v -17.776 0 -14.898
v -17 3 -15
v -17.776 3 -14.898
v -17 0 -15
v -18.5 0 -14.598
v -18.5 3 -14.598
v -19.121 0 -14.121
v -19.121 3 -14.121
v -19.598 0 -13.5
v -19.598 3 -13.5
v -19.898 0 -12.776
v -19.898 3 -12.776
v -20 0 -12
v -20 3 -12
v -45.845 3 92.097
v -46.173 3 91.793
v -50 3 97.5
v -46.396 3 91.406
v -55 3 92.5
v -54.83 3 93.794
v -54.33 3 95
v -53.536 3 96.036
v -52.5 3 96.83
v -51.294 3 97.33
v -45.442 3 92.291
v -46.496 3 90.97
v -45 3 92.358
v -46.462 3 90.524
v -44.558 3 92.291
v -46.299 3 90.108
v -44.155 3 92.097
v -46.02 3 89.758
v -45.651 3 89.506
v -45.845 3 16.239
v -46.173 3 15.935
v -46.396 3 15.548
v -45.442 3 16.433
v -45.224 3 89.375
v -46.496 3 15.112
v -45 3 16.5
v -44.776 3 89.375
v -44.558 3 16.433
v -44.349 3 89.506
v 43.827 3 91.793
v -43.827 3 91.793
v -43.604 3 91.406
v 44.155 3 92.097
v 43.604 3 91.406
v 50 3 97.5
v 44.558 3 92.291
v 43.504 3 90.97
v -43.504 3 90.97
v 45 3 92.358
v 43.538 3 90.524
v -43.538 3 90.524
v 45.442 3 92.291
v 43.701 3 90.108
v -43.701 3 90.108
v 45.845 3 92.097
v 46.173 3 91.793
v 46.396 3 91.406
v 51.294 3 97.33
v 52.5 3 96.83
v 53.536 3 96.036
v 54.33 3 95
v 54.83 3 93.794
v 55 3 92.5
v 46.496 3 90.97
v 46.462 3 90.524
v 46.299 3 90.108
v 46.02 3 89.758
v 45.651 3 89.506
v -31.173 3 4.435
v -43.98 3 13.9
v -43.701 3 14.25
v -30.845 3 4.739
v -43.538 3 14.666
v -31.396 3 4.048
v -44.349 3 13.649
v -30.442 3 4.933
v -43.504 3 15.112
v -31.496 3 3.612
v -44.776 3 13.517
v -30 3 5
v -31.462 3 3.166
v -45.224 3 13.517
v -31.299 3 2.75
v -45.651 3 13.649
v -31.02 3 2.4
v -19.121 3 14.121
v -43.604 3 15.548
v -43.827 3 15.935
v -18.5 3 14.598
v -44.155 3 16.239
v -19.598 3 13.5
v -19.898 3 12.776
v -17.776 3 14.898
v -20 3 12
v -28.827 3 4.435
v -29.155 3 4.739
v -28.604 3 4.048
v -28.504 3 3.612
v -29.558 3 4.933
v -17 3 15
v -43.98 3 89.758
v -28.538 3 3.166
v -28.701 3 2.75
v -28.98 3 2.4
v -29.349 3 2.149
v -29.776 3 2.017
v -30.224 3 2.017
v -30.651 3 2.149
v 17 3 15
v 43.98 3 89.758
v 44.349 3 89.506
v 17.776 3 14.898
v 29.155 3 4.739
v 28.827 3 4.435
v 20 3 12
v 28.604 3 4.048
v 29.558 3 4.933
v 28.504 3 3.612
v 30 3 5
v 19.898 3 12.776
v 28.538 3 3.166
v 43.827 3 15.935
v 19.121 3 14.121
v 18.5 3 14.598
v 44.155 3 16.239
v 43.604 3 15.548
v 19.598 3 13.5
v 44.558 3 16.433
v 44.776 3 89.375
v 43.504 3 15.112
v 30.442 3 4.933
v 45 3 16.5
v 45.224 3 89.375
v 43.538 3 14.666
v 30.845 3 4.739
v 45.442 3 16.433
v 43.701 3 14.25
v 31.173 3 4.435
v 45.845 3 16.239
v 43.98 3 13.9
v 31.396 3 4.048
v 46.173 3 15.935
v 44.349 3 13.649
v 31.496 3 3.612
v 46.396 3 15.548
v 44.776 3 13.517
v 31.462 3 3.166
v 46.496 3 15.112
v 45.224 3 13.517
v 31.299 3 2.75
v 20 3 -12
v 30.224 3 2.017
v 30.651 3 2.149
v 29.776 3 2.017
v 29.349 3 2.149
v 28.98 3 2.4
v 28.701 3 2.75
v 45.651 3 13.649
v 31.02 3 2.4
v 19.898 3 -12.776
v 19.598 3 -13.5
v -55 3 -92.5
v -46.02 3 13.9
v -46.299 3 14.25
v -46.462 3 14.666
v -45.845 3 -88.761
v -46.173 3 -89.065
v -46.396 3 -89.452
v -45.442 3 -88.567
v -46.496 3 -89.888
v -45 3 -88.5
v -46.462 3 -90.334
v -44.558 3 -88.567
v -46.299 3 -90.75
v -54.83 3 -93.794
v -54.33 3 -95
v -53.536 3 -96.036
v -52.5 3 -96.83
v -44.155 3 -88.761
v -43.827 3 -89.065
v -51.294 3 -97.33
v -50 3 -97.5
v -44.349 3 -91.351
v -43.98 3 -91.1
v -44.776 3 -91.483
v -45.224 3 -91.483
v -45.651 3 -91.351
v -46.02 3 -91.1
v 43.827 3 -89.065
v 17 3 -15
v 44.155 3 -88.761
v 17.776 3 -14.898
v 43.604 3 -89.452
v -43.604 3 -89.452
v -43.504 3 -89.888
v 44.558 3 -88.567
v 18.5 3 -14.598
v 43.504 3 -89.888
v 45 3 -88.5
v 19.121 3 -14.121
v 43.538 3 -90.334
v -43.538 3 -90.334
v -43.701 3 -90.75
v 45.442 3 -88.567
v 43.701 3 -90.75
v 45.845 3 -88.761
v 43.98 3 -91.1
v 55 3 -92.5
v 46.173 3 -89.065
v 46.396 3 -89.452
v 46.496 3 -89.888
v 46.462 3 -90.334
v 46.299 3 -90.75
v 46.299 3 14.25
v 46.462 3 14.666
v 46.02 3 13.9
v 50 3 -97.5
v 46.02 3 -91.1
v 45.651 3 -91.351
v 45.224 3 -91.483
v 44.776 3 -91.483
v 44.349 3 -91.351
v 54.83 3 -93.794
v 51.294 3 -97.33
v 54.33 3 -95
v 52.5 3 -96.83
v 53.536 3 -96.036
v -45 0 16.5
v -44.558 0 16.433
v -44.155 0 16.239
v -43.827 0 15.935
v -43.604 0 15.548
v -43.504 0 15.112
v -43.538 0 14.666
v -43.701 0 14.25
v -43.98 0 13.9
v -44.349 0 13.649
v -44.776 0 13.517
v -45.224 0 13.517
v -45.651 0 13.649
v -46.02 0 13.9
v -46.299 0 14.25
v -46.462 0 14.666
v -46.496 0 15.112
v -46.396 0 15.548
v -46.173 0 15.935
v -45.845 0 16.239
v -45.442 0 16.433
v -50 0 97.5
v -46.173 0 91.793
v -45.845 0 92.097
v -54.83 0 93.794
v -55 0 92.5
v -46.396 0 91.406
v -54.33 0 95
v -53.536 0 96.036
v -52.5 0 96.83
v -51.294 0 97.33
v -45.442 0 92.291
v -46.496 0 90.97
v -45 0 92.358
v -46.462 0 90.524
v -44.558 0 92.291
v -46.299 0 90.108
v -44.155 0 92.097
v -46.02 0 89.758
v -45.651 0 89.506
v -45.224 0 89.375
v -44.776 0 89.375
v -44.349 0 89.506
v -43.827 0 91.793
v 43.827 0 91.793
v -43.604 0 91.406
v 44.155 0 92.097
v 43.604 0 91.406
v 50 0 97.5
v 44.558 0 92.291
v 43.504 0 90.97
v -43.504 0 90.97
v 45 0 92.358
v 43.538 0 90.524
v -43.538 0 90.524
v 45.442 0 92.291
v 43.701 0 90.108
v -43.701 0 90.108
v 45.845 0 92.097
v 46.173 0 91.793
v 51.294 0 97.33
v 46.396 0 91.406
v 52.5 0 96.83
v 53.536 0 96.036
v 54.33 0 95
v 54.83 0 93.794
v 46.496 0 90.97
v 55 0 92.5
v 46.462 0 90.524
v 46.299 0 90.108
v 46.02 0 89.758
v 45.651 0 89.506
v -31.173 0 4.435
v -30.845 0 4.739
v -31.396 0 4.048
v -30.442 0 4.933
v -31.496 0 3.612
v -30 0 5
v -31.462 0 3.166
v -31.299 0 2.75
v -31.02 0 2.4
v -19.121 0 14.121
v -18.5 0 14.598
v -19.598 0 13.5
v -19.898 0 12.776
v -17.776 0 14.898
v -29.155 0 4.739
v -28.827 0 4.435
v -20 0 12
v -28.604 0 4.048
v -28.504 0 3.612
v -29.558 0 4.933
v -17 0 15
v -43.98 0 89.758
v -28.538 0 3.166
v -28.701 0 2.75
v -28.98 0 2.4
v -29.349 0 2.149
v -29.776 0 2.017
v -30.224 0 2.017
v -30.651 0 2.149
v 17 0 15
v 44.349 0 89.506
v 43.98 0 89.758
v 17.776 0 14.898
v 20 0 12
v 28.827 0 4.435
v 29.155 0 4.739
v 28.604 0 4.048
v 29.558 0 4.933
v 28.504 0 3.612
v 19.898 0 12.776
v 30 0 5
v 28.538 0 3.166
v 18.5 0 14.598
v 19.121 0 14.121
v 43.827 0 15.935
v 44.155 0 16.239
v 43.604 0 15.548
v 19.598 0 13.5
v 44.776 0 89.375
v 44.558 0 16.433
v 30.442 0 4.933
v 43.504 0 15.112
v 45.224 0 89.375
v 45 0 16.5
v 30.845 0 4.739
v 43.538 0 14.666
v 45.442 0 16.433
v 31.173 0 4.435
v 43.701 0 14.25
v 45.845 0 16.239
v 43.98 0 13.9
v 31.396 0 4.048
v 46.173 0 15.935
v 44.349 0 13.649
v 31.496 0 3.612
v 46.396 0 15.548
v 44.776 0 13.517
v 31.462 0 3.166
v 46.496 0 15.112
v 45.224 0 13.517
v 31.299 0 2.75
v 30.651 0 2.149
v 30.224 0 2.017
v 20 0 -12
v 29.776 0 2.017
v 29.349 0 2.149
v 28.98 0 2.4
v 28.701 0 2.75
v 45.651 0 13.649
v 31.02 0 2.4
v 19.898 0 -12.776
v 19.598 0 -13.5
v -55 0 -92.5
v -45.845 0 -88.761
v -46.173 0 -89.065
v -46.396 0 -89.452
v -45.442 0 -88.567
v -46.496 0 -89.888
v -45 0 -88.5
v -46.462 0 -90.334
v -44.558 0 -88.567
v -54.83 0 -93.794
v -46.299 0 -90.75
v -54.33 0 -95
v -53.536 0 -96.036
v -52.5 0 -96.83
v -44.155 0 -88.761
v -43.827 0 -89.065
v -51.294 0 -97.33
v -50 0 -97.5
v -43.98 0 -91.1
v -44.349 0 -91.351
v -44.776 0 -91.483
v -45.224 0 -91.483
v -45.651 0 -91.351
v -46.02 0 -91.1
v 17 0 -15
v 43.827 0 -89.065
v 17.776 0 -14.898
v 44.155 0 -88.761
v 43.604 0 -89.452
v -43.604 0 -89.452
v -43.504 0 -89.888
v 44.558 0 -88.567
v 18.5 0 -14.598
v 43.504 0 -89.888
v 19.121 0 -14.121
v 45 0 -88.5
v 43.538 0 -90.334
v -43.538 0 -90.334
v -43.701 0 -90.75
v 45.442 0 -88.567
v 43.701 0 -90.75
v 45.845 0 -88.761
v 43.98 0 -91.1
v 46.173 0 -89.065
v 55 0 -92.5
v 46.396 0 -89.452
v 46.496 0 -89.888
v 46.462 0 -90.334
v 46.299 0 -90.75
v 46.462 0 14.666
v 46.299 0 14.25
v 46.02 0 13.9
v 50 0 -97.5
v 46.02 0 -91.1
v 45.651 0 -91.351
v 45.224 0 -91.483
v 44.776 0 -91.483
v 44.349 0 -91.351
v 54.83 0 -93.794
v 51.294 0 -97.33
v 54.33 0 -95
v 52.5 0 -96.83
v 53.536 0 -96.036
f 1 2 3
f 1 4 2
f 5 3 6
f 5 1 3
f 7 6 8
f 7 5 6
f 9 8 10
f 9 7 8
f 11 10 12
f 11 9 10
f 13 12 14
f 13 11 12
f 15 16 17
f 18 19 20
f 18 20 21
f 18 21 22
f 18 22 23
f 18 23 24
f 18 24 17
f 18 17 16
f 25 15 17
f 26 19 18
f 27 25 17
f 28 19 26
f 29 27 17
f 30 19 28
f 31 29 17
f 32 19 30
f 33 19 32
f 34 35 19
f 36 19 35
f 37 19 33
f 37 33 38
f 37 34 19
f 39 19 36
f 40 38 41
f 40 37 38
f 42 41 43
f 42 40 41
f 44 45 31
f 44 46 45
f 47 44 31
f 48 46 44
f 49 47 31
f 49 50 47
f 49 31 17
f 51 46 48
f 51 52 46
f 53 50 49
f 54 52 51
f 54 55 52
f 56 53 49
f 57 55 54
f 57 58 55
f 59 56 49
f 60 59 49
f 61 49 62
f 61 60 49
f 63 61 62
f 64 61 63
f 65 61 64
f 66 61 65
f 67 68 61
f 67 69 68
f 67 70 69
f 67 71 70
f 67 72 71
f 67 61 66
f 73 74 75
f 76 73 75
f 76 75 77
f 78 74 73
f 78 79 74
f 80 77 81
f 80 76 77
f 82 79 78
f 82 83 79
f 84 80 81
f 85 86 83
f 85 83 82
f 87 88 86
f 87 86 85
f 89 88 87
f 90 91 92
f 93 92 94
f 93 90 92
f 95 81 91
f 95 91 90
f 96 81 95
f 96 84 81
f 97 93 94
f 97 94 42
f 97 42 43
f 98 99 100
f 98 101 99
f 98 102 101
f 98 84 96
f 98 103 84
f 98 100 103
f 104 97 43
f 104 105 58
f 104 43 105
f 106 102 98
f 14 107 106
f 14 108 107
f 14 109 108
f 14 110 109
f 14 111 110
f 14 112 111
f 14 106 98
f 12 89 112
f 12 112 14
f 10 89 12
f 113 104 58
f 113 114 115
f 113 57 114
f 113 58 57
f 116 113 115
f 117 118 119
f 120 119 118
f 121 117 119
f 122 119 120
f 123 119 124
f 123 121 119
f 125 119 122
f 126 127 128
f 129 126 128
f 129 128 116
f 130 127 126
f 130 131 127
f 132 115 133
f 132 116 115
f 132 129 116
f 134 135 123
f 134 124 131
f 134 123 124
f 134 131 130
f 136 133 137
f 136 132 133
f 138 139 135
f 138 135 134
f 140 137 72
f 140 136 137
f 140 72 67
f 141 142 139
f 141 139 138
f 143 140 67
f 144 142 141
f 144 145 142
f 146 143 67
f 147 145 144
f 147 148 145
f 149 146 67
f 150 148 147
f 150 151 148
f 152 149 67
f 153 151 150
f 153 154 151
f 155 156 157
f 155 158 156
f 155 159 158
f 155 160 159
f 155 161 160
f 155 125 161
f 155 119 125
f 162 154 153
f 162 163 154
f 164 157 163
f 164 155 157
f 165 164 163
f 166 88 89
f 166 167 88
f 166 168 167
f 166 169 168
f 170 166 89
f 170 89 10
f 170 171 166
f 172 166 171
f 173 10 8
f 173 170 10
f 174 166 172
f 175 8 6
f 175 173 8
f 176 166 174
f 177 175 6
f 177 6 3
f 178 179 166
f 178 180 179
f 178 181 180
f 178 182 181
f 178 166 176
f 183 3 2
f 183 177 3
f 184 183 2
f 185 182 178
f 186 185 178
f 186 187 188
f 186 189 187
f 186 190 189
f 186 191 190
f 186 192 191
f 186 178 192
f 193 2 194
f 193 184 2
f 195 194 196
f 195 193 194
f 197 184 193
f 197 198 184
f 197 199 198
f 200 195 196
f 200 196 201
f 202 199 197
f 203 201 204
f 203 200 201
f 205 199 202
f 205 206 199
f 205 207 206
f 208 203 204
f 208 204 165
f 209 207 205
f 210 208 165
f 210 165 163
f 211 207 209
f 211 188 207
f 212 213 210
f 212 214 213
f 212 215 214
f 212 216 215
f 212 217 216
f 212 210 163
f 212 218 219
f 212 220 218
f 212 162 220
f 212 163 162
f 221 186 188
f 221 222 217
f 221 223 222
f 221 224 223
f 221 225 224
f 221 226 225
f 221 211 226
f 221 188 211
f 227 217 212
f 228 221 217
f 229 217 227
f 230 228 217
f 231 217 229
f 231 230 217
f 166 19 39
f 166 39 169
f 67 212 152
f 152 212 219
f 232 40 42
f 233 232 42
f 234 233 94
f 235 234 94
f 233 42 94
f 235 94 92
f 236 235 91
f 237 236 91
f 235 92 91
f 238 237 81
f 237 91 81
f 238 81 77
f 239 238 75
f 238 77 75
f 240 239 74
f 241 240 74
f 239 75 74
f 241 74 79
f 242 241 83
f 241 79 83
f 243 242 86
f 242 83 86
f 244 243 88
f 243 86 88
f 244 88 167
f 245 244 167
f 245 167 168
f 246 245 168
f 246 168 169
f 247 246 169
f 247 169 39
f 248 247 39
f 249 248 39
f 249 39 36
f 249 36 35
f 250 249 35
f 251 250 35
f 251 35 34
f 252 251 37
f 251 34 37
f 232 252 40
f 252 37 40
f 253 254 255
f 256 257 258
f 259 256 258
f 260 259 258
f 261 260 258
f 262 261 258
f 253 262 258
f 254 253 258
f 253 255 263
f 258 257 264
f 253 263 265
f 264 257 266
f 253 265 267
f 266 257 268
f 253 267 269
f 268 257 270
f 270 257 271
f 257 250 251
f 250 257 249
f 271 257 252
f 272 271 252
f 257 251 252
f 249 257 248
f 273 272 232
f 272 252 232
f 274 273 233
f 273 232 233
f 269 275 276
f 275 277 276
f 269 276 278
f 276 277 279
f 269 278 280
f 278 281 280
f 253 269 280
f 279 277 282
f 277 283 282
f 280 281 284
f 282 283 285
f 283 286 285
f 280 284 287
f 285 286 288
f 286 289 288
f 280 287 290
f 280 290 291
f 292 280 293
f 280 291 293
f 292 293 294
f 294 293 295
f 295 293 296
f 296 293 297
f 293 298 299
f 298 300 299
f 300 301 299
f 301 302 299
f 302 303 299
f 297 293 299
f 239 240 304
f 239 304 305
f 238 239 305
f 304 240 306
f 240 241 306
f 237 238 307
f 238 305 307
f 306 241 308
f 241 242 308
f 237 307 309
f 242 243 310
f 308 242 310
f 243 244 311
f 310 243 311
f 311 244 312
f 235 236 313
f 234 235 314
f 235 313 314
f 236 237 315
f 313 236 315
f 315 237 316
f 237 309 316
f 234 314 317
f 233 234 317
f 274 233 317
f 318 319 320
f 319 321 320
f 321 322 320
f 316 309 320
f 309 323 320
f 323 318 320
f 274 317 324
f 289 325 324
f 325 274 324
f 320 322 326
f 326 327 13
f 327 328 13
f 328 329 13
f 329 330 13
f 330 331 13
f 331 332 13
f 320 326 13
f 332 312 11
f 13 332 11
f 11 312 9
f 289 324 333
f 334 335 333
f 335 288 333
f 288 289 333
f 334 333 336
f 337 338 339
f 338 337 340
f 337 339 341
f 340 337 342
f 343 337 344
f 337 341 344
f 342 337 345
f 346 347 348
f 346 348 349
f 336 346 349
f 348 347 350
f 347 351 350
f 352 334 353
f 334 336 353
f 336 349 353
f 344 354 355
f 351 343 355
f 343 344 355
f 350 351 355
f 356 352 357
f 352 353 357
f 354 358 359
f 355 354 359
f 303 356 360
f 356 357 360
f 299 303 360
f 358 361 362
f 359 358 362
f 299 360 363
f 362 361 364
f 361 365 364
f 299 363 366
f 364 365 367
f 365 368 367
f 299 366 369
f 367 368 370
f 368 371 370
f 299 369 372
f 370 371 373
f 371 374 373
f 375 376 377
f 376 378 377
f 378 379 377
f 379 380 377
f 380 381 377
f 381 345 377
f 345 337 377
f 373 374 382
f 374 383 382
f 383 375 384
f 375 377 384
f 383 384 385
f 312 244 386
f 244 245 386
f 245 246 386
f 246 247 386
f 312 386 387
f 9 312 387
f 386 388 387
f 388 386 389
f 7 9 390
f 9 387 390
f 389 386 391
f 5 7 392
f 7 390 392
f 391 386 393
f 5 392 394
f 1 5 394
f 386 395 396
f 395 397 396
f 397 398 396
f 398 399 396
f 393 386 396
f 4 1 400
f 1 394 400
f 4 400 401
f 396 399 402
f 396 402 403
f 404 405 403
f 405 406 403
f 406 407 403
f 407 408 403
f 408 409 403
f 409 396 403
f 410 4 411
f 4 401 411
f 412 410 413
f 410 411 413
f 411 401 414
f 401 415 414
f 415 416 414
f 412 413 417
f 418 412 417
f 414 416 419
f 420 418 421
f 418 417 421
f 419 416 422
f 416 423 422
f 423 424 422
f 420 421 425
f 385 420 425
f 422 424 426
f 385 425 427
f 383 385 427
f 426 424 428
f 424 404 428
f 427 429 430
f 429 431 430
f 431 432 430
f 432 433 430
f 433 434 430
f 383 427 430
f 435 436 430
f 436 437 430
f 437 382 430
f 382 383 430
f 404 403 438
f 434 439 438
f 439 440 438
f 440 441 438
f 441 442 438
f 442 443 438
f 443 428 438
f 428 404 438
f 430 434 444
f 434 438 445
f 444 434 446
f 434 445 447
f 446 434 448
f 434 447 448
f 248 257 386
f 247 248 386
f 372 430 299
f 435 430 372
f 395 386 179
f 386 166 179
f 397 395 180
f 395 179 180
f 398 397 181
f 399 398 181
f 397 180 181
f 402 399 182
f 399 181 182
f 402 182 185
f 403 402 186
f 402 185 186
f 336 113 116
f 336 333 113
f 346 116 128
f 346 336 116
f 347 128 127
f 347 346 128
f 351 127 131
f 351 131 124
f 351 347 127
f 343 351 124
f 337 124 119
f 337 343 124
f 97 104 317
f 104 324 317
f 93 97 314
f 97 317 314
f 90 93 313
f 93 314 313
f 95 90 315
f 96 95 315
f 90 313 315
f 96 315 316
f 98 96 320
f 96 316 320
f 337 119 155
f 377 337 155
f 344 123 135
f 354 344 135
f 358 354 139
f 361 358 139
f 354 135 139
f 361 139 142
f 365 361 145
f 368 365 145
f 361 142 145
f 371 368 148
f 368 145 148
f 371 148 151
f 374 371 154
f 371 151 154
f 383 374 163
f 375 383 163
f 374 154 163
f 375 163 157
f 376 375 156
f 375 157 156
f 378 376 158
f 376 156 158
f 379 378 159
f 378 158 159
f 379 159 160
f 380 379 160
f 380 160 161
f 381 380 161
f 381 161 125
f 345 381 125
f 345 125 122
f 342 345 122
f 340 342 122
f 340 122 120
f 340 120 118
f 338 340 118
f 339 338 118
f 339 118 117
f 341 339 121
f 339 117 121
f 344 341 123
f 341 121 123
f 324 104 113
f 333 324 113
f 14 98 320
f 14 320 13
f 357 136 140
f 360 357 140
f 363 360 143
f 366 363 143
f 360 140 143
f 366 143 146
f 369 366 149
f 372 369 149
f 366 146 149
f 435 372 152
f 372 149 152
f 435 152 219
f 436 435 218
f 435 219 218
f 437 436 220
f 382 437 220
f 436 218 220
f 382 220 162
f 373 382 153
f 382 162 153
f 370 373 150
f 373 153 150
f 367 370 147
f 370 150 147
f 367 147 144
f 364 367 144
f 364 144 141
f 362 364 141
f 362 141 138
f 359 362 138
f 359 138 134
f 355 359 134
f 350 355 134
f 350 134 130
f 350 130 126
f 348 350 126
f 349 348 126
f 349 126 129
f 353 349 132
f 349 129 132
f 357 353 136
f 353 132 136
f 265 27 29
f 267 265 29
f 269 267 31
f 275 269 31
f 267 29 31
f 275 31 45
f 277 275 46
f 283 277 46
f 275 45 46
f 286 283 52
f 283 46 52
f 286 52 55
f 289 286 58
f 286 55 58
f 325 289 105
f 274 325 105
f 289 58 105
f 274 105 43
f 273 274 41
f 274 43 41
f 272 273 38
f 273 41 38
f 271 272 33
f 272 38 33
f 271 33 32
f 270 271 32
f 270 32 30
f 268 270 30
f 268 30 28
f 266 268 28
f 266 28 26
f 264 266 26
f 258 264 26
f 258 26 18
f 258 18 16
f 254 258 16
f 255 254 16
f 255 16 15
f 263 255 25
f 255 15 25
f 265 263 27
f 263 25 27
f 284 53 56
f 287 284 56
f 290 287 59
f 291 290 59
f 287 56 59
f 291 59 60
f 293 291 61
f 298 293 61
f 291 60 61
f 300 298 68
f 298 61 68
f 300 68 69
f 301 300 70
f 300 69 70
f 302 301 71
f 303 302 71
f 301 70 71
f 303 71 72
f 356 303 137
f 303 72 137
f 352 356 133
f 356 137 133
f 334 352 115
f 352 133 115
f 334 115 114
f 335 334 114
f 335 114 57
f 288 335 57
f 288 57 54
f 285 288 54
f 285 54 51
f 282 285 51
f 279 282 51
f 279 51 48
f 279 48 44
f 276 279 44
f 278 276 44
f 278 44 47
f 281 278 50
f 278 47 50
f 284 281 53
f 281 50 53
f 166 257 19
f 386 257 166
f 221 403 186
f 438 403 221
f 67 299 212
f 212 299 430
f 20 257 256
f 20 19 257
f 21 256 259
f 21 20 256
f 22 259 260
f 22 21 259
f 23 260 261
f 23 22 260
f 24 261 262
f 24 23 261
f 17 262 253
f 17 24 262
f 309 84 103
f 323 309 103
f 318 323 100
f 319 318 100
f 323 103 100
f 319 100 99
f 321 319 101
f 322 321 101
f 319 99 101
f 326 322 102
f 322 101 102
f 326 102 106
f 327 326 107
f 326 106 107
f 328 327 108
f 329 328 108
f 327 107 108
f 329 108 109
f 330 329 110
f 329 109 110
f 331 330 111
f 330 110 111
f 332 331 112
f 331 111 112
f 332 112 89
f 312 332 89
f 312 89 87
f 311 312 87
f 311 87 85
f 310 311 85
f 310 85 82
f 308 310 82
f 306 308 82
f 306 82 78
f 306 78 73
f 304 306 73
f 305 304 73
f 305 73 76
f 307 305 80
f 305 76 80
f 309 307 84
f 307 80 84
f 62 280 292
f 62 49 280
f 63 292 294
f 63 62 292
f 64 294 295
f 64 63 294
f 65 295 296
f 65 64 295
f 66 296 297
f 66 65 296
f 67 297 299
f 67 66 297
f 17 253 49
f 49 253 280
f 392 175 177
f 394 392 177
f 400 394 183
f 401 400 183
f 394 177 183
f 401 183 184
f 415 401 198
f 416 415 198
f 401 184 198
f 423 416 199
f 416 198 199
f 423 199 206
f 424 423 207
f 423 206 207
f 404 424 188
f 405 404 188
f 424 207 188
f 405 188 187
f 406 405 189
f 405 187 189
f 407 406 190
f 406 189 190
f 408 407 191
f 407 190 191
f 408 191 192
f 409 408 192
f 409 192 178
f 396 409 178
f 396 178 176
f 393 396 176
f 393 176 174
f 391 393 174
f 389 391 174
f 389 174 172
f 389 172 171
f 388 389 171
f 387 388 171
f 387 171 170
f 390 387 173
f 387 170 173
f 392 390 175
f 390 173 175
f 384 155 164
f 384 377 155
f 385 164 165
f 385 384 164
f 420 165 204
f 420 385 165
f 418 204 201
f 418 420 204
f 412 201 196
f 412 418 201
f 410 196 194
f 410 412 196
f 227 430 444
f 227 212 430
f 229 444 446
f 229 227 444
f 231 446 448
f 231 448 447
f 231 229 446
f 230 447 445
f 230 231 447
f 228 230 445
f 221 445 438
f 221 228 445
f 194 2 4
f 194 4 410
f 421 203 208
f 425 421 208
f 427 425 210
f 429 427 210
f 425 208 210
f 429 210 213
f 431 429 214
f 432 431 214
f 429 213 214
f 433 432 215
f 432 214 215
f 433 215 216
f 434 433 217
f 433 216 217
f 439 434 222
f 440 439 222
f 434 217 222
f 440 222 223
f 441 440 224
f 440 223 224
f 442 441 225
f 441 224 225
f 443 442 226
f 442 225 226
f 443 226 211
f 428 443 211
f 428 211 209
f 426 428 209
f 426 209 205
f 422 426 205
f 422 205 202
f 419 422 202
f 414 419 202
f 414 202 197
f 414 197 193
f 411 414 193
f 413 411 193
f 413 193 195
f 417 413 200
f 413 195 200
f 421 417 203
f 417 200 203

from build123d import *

# Parameters (mm, degrees)
CROQUIS1_W              = 110
CROQUIS1_H              = 195
SALIENTE_EXTRUIR1_DEPTH = 3
REDONDEO1_R             = 5
CROQUIS2_R              = 1.5
CORTAR_EXTRUIR1_DEPTH   = 3
CROQUIS3_W              = 40
CROQUIS3_H              = 30
CORTAR_EXTRUIR2_DEPTH   = 3
REDONDEO2_R             = 3


with BuildPart() as part:
    # Croquis1 → Saliente-Extruir1 (new body)
    with BuildSketch(Plane(origin=(0, 0, 0), x_dir=(1, 0, 0), z_dir=(0, 1, 0))):
        Rectangle(CROQUIS1_W, CROQUIS1_H)
    extrude(amount=SALIENTE_EXTRUIR1_DEPTH)

    # Redondeo1
    redondeo1_edges = [part.edges().sort_by_distance(p)[0] for p in [
        (55, 1.5, 97.5),
        (-55, 1.5, 97.5),
        (-55, 1.5, -97.5),
        (55, 1.5, -97.5),
    ]]
    fillet(redondeo1_edges, radius=REDONDEO1_R)

    # Croquis2 → Cortar-Extruir1 (cut)
    with BuildSketch(Plane(origin=(0, 3, 0), x_dir=(1, 0, 0), z_dir=(0, 1, 0))):
        with Locations(Location((-45, -90.857864376, 0), (0, 0, 270))):
            Circle(CROQUIS2_R)
        with Locations(Location((-45, -15, 0), (0, 0, 270))):
            Circle(CROQUIS2_R)
        with Locations(Location((-45, 90, 0), (0, 0, 270))):
            Circle(CROQUIS2_R)
        with Locations(Location((45, 90, 0), (0, 0, 270))):
            Circle(CROQUIS2_R)
        with Locations(Location((45, -15, 0), (0, 0, 270))):
            Circle(CROQUIS2_R)
        with Locations(Location((45, -90.857864376, 0), (0, 0, 270))):
            Circle(CROQUIS2_R)
        with Locations(Location((-30, -3.5, 0), (0, 0, 270))):
            Circle(CROQUIS2_R)
        with Locations(Location((30, -3.5, 0), (0, 0, 270))):
            Circle(CROQUIS2_R)
    extrude(amount=-CORTAR_EXTRUIR1_DEPTH, mode=Mode.SUBTRACT)

    # Croquis3 → Cortar-Extruir2 (cut)
    with BuildSketch(Plane(origin=(0, 3, 0), x_dir=(1, 0, 0), z_dir=(0, 1, 0))):
        Rectangle(CROQUIS3_W, CROQUIS3_H)
    extrude(amount=-CORTAR_EXTRUIR2_DEPTH, mode=Mode.SUBTRACT)

    # Redondeo2
    redondeo2_edges = [part.edges().sort_by_distance(p)[0] for p in [
        (20, 1.5, -15),
        (20, 1.5, 15),
        (-20, 1.5, 15),
        (-20, 1.5, -15),
    ]]
    fillet(redondeo2_edges, radius=REDONDEO2_R)


solid = part.part
